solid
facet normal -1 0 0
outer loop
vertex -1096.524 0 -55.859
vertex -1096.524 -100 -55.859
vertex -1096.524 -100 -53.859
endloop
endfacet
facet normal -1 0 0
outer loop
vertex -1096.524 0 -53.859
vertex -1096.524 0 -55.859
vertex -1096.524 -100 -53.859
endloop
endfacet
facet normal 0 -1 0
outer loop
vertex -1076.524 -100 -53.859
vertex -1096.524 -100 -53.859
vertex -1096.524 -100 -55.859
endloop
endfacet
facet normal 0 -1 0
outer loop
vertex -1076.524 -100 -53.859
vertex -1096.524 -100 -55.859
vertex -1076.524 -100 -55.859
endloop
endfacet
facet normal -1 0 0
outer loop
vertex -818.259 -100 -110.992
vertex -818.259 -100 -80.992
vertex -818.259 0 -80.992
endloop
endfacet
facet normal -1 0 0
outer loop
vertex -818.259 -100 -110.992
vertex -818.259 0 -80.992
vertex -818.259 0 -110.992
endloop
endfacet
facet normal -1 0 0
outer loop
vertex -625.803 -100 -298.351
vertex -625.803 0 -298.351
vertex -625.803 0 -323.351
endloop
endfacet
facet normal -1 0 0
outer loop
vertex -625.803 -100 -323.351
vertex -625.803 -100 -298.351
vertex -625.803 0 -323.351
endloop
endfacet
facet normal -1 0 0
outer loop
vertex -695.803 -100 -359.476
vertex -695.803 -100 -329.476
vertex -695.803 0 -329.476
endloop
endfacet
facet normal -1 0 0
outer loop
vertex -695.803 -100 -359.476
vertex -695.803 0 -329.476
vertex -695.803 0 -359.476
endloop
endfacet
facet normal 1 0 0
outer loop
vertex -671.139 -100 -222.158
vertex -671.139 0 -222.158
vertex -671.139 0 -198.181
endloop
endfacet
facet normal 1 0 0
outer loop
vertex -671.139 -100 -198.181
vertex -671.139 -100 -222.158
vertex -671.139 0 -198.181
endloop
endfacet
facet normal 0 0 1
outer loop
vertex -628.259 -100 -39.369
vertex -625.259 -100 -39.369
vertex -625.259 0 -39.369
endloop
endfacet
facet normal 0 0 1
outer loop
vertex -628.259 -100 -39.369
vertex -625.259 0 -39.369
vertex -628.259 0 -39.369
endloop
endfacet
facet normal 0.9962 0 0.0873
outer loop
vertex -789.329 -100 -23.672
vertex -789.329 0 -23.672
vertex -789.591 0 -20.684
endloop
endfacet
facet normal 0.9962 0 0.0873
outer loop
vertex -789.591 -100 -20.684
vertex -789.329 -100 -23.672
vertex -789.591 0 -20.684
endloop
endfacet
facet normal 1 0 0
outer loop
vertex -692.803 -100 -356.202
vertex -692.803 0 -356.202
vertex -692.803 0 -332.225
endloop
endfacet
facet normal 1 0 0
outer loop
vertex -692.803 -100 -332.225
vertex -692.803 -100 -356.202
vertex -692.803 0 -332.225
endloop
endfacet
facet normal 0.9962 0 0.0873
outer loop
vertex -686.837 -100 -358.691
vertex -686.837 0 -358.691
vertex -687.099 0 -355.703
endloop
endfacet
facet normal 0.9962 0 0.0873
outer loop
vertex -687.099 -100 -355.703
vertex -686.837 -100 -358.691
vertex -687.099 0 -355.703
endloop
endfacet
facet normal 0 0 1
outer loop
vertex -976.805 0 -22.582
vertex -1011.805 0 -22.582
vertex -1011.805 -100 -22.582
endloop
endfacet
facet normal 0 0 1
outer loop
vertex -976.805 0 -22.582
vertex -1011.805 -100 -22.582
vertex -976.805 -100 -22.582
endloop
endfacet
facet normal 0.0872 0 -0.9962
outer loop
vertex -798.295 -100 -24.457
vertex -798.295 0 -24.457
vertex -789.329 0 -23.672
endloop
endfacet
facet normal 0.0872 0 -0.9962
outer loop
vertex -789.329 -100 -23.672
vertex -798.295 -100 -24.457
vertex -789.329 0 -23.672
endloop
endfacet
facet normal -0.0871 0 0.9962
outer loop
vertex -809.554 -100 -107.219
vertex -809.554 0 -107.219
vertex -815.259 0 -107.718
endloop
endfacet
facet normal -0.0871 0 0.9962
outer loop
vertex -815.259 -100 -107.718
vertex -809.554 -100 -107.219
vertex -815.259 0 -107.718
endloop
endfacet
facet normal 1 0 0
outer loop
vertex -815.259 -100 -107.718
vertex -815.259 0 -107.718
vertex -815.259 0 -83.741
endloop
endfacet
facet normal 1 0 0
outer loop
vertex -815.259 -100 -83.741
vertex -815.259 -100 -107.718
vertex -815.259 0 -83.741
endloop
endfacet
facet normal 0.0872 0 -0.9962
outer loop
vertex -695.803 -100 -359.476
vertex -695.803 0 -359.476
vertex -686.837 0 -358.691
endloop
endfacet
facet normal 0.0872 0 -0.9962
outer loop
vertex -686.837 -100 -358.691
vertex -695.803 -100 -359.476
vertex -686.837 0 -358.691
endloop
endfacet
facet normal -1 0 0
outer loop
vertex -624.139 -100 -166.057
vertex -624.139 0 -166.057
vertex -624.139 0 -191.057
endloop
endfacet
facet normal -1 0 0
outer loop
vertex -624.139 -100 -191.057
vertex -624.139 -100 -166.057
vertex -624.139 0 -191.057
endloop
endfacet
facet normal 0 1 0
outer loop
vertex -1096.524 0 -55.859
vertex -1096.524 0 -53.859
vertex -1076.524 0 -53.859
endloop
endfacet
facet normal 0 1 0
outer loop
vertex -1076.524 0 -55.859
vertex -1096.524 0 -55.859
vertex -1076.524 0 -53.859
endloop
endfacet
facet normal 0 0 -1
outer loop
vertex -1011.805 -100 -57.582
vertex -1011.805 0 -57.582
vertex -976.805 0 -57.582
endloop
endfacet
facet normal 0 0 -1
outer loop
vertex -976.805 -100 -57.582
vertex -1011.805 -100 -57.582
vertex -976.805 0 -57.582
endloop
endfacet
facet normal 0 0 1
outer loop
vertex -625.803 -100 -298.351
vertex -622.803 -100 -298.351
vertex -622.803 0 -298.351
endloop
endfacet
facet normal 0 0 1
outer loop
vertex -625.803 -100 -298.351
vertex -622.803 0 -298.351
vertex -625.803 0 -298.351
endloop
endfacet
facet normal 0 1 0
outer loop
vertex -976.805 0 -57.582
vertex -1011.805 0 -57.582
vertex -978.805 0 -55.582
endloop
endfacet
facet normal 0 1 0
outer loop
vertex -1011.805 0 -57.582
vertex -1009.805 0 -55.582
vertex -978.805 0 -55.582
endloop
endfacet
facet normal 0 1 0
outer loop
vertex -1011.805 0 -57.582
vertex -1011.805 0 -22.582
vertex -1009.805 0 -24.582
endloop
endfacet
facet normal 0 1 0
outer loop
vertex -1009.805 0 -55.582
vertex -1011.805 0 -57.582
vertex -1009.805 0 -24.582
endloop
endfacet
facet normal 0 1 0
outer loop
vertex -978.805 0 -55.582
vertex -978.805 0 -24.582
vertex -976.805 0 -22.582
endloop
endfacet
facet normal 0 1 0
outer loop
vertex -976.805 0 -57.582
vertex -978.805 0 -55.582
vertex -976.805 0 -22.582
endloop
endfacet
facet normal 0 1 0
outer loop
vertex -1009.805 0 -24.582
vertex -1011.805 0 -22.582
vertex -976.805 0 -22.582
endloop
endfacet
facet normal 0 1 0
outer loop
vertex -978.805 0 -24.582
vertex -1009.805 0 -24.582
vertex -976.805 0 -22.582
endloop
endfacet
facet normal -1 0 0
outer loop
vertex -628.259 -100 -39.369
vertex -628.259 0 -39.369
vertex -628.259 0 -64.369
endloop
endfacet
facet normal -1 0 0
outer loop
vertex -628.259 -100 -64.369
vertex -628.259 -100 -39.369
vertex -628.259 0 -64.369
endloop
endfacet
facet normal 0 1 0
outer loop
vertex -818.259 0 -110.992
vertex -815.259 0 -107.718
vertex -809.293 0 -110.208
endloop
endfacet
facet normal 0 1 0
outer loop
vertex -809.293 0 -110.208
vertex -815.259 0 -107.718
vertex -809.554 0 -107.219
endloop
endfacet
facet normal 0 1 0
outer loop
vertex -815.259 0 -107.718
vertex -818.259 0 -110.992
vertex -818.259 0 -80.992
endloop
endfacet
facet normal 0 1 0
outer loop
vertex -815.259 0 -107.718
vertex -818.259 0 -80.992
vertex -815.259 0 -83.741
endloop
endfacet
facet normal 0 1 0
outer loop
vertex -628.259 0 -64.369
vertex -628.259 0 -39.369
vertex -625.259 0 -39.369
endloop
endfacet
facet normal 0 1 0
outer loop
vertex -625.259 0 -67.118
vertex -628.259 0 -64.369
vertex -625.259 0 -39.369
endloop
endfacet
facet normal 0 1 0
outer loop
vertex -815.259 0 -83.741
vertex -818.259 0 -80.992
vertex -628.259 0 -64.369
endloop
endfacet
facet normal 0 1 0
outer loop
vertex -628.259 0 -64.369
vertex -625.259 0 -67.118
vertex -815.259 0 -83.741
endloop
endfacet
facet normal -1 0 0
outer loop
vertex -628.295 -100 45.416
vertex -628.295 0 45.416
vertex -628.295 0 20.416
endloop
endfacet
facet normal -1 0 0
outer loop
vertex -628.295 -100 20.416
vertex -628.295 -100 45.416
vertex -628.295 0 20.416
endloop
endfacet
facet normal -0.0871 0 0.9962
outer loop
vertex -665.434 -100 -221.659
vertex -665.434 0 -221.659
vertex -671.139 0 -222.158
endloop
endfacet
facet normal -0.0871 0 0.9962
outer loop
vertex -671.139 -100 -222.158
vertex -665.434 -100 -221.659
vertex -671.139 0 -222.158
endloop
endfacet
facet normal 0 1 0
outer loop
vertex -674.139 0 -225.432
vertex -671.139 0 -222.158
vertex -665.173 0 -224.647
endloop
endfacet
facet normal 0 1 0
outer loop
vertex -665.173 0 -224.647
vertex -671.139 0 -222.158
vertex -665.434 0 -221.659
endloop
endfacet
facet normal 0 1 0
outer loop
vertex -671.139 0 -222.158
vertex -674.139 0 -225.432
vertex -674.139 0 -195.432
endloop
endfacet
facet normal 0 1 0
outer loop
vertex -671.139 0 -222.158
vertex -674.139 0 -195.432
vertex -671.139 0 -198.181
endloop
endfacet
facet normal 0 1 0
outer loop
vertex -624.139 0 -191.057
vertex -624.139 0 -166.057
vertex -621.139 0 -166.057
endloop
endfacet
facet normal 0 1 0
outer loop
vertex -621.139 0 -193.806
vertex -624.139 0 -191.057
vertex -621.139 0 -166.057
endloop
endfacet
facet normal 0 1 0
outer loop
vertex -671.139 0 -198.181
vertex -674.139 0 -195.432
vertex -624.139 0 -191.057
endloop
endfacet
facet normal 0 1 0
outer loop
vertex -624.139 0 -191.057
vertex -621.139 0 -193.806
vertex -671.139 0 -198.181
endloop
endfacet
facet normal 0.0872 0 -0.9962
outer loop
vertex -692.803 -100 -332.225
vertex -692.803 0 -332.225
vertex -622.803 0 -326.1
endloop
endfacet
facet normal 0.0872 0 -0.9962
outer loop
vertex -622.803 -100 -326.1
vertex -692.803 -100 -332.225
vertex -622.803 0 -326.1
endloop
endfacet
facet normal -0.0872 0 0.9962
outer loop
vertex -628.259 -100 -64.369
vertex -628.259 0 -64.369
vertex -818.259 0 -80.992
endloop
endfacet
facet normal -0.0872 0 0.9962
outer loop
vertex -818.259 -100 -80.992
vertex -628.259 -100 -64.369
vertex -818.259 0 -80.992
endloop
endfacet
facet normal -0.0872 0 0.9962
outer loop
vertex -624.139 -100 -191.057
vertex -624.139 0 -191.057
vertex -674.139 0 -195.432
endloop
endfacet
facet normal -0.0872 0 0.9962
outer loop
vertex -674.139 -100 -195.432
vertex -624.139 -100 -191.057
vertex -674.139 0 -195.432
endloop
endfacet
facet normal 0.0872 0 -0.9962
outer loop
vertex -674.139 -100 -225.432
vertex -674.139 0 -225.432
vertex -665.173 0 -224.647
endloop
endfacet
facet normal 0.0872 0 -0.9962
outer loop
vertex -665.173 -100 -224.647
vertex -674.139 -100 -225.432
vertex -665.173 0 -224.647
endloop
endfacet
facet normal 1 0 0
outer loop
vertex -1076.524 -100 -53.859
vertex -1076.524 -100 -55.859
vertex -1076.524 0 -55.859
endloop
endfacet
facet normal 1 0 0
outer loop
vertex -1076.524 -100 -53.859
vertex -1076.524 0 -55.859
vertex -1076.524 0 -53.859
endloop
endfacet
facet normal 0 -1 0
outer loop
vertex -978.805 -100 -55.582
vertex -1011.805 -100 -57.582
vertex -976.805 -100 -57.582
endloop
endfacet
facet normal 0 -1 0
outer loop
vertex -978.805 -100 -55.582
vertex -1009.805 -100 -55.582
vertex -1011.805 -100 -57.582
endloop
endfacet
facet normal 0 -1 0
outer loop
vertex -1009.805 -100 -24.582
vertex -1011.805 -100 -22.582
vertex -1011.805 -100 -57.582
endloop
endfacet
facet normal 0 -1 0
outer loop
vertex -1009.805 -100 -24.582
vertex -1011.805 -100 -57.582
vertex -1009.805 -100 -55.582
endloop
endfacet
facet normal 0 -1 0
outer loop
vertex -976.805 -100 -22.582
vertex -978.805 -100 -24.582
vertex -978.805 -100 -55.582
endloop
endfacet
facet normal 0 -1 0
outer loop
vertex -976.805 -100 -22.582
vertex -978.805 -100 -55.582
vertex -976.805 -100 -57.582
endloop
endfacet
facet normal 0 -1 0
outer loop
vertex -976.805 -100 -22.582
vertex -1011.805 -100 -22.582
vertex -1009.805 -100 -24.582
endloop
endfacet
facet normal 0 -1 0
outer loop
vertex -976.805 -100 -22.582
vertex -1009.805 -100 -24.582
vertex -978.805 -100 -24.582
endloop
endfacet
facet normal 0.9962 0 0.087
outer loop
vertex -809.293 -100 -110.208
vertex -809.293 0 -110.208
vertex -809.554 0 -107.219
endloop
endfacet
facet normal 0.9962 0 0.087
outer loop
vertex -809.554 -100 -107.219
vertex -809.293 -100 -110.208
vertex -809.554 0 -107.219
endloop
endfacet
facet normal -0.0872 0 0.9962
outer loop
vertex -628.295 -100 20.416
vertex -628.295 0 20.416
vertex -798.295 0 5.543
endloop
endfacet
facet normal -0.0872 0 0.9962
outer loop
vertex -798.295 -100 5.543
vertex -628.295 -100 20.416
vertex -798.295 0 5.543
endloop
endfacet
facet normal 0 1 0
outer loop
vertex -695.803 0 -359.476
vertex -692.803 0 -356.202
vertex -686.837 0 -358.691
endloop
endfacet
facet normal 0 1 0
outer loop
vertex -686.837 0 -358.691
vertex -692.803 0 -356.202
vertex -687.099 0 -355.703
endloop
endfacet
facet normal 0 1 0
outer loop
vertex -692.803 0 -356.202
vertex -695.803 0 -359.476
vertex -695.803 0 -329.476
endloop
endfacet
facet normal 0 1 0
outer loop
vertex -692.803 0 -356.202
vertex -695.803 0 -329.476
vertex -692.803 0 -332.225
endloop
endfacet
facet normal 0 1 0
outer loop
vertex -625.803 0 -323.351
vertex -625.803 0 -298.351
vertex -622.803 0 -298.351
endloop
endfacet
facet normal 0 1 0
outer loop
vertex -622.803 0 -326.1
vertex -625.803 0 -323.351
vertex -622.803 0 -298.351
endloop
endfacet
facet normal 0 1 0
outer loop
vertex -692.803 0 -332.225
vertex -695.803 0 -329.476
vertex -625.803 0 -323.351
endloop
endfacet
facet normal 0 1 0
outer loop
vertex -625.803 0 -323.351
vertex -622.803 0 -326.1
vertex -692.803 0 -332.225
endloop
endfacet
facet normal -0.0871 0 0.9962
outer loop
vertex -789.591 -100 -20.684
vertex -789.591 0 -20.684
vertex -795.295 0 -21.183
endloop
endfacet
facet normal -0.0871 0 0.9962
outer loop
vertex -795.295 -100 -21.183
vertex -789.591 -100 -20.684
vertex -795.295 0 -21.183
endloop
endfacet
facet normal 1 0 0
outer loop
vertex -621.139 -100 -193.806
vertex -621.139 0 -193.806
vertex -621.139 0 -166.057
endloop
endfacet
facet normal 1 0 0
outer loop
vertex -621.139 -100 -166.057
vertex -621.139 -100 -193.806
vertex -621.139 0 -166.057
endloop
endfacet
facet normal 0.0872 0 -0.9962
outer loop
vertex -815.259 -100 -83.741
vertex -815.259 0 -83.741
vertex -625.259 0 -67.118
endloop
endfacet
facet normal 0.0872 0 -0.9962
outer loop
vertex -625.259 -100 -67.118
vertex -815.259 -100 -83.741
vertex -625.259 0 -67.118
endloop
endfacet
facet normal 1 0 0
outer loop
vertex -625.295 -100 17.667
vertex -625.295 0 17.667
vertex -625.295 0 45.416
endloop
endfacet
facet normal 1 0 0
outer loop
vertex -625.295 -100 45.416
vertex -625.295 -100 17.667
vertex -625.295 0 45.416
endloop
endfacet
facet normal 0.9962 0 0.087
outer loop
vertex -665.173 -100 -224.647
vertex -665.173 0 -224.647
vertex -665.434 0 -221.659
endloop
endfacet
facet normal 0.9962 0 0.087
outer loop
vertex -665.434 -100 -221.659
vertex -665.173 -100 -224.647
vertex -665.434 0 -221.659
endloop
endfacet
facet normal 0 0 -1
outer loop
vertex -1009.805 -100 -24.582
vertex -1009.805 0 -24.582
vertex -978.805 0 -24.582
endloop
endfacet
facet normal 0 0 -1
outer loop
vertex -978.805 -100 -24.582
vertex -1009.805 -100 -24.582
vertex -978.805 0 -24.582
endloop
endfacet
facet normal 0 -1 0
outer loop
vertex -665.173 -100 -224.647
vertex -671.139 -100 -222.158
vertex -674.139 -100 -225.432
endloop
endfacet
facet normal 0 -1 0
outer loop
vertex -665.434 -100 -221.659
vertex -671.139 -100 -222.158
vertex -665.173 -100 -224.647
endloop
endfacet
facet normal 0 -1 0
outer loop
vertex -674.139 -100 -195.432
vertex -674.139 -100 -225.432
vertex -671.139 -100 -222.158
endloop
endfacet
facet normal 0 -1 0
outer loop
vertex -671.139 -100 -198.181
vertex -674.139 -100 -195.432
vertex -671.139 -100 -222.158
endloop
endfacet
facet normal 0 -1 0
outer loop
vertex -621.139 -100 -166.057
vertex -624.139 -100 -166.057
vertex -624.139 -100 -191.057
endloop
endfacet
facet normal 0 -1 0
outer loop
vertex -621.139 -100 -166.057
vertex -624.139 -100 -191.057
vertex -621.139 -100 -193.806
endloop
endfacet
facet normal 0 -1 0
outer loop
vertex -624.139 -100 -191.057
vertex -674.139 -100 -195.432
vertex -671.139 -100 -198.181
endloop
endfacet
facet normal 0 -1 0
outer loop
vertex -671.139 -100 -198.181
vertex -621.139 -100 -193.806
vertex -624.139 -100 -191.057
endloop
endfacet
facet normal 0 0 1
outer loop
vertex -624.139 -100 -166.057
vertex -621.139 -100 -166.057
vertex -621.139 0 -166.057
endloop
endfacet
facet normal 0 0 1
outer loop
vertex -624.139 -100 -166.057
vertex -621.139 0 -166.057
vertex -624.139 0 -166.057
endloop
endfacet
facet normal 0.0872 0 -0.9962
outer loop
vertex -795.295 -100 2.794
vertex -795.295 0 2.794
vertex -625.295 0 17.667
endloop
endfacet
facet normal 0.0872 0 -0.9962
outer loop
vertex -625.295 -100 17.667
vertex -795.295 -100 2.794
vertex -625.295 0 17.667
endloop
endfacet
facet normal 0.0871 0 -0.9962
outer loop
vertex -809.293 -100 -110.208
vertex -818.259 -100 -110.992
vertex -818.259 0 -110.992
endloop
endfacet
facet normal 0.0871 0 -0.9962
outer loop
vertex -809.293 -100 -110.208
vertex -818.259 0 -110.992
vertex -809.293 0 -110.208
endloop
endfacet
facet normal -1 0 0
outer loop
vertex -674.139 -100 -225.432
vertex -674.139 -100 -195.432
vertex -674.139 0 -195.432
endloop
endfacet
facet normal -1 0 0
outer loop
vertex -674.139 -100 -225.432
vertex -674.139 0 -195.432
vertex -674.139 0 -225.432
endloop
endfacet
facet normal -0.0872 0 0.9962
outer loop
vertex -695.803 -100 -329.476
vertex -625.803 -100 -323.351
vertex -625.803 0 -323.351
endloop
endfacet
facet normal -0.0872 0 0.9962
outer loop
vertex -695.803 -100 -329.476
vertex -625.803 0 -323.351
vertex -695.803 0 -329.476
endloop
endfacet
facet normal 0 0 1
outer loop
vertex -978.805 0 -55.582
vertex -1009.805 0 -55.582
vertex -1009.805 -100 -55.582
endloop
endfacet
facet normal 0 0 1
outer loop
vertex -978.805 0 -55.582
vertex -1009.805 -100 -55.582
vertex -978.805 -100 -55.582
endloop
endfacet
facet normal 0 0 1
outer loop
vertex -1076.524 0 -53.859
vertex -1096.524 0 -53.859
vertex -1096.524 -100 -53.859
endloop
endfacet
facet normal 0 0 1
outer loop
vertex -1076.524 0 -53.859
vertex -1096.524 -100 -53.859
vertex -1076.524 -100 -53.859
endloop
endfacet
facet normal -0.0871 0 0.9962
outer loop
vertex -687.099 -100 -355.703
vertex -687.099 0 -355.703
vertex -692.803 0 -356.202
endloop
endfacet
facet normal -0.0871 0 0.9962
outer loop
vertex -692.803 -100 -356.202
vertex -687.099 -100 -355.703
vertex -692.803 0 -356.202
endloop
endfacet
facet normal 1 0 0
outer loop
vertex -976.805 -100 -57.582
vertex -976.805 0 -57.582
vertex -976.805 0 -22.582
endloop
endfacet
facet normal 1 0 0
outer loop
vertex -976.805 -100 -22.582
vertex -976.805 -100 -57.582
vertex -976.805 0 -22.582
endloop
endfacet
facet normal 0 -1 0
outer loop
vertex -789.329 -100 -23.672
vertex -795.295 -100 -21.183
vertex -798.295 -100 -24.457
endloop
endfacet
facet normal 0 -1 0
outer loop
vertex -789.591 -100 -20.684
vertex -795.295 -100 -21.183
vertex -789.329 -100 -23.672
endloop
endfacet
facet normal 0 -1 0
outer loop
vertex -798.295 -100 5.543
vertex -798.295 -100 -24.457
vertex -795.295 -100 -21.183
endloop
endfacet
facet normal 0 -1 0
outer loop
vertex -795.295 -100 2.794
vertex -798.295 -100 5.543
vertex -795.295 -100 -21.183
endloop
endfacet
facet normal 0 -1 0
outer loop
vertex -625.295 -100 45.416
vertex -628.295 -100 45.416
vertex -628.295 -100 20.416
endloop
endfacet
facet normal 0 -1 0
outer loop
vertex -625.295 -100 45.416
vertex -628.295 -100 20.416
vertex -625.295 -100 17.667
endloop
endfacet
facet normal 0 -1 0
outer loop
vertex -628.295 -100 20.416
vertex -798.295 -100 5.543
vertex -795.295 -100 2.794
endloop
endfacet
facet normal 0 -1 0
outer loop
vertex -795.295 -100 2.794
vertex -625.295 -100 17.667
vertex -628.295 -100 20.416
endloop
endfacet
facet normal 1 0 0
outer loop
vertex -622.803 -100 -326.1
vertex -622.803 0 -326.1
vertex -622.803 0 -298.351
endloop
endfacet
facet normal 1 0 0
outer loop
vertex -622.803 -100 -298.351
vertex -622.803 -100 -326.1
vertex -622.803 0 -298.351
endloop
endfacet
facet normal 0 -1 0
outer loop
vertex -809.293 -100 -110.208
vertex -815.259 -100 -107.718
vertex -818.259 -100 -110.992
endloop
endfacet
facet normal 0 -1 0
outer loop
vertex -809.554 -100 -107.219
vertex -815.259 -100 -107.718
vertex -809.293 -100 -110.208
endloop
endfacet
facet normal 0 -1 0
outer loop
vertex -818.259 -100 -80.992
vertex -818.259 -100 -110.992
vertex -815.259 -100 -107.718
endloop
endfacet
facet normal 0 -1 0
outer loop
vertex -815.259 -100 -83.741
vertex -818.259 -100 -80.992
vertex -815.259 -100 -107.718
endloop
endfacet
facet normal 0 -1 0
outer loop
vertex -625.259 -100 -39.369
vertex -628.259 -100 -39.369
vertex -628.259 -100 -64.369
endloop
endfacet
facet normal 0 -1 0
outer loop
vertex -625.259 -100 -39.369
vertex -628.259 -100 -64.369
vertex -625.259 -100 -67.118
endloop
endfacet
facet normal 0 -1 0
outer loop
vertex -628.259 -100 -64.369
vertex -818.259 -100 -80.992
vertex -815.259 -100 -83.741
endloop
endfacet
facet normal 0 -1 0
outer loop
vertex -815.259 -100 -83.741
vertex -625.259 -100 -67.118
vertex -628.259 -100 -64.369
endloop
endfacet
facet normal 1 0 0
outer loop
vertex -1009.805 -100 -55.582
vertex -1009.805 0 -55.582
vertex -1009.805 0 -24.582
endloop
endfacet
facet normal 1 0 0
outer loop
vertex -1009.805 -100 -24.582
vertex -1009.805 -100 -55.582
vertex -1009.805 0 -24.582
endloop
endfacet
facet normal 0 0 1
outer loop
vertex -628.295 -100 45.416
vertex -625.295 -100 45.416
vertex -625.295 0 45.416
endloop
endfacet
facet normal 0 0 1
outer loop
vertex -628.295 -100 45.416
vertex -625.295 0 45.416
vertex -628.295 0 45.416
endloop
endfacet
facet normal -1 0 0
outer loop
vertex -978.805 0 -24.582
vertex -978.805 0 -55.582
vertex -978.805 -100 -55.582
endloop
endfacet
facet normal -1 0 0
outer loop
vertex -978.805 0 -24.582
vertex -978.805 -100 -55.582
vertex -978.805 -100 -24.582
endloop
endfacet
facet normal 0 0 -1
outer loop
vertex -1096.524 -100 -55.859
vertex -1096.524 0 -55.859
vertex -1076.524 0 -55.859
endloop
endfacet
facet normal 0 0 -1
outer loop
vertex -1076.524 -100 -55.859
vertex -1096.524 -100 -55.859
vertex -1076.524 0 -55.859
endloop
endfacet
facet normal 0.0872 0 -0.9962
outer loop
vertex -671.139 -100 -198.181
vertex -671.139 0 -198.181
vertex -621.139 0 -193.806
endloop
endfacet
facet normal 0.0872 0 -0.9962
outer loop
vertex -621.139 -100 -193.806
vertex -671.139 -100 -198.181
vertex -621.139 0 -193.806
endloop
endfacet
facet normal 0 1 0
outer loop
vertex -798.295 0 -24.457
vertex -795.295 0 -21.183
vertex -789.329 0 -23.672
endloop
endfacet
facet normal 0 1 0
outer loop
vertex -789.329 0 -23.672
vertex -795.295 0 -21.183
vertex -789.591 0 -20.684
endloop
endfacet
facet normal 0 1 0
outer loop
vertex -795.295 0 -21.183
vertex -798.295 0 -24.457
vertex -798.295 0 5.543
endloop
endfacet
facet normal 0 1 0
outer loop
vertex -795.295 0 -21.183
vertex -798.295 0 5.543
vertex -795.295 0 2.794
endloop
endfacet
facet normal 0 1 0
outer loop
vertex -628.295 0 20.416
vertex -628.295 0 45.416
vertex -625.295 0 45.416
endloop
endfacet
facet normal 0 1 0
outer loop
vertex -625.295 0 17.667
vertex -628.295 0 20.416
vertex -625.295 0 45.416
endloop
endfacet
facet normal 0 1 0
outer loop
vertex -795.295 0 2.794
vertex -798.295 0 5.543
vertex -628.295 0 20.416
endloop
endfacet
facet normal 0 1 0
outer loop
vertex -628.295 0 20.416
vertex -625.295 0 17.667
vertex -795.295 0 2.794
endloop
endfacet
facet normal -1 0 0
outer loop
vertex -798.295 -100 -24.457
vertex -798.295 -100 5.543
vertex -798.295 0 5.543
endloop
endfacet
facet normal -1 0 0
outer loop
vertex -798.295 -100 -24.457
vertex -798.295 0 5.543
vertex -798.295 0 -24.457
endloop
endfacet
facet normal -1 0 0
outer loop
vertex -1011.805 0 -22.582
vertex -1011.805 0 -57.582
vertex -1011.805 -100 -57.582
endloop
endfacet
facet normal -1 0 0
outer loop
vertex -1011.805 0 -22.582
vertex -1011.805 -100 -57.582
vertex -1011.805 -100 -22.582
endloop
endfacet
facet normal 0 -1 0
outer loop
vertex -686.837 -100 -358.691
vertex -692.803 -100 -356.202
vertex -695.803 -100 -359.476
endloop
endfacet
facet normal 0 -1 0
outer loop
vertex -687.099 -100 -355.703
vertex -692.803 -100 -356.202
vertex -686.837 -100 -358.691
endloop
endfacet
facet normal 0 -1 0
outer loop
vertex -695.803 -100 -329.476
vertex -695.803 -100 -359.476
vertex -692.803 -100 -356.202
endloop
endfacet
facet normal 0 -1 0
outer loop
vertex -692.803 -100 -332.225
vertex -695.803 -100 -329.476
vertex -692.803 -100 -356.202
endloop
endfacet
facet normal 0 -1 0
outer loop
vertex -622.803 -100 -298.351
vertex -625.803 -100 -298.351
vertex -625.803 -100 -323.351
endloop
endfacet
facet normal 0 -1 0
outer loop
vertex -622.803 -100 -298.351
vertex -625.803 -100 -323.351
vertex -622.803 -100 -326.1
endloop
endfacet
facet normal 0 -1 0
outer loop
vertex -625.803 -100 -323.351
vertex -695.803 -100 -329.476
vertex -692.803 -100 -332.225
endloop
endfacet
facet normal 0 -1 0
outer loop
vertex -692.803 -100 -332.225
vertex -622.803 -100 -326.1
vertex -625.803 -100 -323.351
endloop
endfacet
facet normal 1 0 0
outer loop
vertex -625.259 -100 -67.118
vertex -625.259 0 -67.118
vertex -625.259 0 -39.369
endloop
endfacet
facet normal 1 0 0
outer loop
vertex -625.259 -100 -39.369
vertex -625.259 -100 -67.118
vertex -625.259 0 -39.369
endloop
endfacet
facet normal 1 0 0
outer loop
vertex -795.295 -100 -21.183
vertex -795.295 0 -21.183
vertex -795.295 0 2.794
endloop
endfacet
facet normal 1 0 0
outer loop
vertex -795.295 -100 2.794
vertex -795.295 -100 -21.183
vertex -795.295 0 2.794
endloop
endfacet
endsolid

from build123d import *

# Parameters (mm, degrees)
F0_W     = 35
F0_H     = 35
F0_W_2   = 31
F0_H_2   = 31
F1_DEPTH = 100
F0_W_3   = 20
F0_H_3   = 2
F2_DEPTH = 100


with BuildPart() as f1:
    # F0 (on Front) → F1 (new body)
    with BuildSketch(Plane.XZ):
        with Locations((-994.304813, -40.082299)):
            Rectangle(F0_W, F0_H)
        with Locations((-994.304813, -40.082299)):
            Rectangle(F0_W_2, F0_H_2, mode=Mode.SUBTRACT)
    extrude(amount=F1_DEPTH)

    # F0 (on Front) → F2 (join)
    with BuildSketch(Plane.XZ):
        Polygon((-625.295087, 45.416288), (-628.295087, 45.416288), (-628.295087, 20.416288), (-798.295087, 5.543215), (-798.295087, -24.456785), (-789.329335, -23.672383), (-789.590802, -20.683799), (-795.295087, -21.182859), (-795.295087, 2.794222), (-625.295087, 17.667294), align=None)
        with Locations((-994.304813, -40.082299)):
            Rectangle(F0_W, F0_H)
        with Locations((-994.304813, -40.082299)):
            Rectangle(F0_W_2, F0_H_2, mode=Mode.SUBTRACT)
        with Locations((-1086.523762, -54.859216)):
            Rectangle(F0_W_3, F0_H_3)
        Polygon((-625.258767, -39.369393), (-628.258767, -39.369393), (-628.258767, -64.369393), (-818.258767, -80.992239), (-818.258767, -110.992239), (-809.293014, -110.207837), (-809.554482, -107.219253), (-815.258767, -107.718313), (-815.258767, -83.741232), (-625.258767, -67.118386), align=None)
        Polygon((-621.138715, -166.057405), (-624.138715, -166.057405), (-624.138715, -191.057405), (-674.138715, -195.431838), (-674.138715, -225.431838), (-665.172962, -224.647436), (-665.43443, -221.658852), (-671.138715, -222.157913), (-671.138715, -198.180832), (-621.138715, -193.806398), align=None)
        Polygon((-622.803207, -298.35148), (-625.803207, -298.35148), (-625.803207, -323.35148), (-695.803207, -329.475687), (-695.803207, -359.475687), (-686.837455, -358.691285), (-687.098922, -355.702701), (-692.803207, -356.201761), (-692.803207, -332.22468), (-622.803207, -326.100474), align=None)
    extrude(amount=F2_DEPTH)


solid = f1.part
